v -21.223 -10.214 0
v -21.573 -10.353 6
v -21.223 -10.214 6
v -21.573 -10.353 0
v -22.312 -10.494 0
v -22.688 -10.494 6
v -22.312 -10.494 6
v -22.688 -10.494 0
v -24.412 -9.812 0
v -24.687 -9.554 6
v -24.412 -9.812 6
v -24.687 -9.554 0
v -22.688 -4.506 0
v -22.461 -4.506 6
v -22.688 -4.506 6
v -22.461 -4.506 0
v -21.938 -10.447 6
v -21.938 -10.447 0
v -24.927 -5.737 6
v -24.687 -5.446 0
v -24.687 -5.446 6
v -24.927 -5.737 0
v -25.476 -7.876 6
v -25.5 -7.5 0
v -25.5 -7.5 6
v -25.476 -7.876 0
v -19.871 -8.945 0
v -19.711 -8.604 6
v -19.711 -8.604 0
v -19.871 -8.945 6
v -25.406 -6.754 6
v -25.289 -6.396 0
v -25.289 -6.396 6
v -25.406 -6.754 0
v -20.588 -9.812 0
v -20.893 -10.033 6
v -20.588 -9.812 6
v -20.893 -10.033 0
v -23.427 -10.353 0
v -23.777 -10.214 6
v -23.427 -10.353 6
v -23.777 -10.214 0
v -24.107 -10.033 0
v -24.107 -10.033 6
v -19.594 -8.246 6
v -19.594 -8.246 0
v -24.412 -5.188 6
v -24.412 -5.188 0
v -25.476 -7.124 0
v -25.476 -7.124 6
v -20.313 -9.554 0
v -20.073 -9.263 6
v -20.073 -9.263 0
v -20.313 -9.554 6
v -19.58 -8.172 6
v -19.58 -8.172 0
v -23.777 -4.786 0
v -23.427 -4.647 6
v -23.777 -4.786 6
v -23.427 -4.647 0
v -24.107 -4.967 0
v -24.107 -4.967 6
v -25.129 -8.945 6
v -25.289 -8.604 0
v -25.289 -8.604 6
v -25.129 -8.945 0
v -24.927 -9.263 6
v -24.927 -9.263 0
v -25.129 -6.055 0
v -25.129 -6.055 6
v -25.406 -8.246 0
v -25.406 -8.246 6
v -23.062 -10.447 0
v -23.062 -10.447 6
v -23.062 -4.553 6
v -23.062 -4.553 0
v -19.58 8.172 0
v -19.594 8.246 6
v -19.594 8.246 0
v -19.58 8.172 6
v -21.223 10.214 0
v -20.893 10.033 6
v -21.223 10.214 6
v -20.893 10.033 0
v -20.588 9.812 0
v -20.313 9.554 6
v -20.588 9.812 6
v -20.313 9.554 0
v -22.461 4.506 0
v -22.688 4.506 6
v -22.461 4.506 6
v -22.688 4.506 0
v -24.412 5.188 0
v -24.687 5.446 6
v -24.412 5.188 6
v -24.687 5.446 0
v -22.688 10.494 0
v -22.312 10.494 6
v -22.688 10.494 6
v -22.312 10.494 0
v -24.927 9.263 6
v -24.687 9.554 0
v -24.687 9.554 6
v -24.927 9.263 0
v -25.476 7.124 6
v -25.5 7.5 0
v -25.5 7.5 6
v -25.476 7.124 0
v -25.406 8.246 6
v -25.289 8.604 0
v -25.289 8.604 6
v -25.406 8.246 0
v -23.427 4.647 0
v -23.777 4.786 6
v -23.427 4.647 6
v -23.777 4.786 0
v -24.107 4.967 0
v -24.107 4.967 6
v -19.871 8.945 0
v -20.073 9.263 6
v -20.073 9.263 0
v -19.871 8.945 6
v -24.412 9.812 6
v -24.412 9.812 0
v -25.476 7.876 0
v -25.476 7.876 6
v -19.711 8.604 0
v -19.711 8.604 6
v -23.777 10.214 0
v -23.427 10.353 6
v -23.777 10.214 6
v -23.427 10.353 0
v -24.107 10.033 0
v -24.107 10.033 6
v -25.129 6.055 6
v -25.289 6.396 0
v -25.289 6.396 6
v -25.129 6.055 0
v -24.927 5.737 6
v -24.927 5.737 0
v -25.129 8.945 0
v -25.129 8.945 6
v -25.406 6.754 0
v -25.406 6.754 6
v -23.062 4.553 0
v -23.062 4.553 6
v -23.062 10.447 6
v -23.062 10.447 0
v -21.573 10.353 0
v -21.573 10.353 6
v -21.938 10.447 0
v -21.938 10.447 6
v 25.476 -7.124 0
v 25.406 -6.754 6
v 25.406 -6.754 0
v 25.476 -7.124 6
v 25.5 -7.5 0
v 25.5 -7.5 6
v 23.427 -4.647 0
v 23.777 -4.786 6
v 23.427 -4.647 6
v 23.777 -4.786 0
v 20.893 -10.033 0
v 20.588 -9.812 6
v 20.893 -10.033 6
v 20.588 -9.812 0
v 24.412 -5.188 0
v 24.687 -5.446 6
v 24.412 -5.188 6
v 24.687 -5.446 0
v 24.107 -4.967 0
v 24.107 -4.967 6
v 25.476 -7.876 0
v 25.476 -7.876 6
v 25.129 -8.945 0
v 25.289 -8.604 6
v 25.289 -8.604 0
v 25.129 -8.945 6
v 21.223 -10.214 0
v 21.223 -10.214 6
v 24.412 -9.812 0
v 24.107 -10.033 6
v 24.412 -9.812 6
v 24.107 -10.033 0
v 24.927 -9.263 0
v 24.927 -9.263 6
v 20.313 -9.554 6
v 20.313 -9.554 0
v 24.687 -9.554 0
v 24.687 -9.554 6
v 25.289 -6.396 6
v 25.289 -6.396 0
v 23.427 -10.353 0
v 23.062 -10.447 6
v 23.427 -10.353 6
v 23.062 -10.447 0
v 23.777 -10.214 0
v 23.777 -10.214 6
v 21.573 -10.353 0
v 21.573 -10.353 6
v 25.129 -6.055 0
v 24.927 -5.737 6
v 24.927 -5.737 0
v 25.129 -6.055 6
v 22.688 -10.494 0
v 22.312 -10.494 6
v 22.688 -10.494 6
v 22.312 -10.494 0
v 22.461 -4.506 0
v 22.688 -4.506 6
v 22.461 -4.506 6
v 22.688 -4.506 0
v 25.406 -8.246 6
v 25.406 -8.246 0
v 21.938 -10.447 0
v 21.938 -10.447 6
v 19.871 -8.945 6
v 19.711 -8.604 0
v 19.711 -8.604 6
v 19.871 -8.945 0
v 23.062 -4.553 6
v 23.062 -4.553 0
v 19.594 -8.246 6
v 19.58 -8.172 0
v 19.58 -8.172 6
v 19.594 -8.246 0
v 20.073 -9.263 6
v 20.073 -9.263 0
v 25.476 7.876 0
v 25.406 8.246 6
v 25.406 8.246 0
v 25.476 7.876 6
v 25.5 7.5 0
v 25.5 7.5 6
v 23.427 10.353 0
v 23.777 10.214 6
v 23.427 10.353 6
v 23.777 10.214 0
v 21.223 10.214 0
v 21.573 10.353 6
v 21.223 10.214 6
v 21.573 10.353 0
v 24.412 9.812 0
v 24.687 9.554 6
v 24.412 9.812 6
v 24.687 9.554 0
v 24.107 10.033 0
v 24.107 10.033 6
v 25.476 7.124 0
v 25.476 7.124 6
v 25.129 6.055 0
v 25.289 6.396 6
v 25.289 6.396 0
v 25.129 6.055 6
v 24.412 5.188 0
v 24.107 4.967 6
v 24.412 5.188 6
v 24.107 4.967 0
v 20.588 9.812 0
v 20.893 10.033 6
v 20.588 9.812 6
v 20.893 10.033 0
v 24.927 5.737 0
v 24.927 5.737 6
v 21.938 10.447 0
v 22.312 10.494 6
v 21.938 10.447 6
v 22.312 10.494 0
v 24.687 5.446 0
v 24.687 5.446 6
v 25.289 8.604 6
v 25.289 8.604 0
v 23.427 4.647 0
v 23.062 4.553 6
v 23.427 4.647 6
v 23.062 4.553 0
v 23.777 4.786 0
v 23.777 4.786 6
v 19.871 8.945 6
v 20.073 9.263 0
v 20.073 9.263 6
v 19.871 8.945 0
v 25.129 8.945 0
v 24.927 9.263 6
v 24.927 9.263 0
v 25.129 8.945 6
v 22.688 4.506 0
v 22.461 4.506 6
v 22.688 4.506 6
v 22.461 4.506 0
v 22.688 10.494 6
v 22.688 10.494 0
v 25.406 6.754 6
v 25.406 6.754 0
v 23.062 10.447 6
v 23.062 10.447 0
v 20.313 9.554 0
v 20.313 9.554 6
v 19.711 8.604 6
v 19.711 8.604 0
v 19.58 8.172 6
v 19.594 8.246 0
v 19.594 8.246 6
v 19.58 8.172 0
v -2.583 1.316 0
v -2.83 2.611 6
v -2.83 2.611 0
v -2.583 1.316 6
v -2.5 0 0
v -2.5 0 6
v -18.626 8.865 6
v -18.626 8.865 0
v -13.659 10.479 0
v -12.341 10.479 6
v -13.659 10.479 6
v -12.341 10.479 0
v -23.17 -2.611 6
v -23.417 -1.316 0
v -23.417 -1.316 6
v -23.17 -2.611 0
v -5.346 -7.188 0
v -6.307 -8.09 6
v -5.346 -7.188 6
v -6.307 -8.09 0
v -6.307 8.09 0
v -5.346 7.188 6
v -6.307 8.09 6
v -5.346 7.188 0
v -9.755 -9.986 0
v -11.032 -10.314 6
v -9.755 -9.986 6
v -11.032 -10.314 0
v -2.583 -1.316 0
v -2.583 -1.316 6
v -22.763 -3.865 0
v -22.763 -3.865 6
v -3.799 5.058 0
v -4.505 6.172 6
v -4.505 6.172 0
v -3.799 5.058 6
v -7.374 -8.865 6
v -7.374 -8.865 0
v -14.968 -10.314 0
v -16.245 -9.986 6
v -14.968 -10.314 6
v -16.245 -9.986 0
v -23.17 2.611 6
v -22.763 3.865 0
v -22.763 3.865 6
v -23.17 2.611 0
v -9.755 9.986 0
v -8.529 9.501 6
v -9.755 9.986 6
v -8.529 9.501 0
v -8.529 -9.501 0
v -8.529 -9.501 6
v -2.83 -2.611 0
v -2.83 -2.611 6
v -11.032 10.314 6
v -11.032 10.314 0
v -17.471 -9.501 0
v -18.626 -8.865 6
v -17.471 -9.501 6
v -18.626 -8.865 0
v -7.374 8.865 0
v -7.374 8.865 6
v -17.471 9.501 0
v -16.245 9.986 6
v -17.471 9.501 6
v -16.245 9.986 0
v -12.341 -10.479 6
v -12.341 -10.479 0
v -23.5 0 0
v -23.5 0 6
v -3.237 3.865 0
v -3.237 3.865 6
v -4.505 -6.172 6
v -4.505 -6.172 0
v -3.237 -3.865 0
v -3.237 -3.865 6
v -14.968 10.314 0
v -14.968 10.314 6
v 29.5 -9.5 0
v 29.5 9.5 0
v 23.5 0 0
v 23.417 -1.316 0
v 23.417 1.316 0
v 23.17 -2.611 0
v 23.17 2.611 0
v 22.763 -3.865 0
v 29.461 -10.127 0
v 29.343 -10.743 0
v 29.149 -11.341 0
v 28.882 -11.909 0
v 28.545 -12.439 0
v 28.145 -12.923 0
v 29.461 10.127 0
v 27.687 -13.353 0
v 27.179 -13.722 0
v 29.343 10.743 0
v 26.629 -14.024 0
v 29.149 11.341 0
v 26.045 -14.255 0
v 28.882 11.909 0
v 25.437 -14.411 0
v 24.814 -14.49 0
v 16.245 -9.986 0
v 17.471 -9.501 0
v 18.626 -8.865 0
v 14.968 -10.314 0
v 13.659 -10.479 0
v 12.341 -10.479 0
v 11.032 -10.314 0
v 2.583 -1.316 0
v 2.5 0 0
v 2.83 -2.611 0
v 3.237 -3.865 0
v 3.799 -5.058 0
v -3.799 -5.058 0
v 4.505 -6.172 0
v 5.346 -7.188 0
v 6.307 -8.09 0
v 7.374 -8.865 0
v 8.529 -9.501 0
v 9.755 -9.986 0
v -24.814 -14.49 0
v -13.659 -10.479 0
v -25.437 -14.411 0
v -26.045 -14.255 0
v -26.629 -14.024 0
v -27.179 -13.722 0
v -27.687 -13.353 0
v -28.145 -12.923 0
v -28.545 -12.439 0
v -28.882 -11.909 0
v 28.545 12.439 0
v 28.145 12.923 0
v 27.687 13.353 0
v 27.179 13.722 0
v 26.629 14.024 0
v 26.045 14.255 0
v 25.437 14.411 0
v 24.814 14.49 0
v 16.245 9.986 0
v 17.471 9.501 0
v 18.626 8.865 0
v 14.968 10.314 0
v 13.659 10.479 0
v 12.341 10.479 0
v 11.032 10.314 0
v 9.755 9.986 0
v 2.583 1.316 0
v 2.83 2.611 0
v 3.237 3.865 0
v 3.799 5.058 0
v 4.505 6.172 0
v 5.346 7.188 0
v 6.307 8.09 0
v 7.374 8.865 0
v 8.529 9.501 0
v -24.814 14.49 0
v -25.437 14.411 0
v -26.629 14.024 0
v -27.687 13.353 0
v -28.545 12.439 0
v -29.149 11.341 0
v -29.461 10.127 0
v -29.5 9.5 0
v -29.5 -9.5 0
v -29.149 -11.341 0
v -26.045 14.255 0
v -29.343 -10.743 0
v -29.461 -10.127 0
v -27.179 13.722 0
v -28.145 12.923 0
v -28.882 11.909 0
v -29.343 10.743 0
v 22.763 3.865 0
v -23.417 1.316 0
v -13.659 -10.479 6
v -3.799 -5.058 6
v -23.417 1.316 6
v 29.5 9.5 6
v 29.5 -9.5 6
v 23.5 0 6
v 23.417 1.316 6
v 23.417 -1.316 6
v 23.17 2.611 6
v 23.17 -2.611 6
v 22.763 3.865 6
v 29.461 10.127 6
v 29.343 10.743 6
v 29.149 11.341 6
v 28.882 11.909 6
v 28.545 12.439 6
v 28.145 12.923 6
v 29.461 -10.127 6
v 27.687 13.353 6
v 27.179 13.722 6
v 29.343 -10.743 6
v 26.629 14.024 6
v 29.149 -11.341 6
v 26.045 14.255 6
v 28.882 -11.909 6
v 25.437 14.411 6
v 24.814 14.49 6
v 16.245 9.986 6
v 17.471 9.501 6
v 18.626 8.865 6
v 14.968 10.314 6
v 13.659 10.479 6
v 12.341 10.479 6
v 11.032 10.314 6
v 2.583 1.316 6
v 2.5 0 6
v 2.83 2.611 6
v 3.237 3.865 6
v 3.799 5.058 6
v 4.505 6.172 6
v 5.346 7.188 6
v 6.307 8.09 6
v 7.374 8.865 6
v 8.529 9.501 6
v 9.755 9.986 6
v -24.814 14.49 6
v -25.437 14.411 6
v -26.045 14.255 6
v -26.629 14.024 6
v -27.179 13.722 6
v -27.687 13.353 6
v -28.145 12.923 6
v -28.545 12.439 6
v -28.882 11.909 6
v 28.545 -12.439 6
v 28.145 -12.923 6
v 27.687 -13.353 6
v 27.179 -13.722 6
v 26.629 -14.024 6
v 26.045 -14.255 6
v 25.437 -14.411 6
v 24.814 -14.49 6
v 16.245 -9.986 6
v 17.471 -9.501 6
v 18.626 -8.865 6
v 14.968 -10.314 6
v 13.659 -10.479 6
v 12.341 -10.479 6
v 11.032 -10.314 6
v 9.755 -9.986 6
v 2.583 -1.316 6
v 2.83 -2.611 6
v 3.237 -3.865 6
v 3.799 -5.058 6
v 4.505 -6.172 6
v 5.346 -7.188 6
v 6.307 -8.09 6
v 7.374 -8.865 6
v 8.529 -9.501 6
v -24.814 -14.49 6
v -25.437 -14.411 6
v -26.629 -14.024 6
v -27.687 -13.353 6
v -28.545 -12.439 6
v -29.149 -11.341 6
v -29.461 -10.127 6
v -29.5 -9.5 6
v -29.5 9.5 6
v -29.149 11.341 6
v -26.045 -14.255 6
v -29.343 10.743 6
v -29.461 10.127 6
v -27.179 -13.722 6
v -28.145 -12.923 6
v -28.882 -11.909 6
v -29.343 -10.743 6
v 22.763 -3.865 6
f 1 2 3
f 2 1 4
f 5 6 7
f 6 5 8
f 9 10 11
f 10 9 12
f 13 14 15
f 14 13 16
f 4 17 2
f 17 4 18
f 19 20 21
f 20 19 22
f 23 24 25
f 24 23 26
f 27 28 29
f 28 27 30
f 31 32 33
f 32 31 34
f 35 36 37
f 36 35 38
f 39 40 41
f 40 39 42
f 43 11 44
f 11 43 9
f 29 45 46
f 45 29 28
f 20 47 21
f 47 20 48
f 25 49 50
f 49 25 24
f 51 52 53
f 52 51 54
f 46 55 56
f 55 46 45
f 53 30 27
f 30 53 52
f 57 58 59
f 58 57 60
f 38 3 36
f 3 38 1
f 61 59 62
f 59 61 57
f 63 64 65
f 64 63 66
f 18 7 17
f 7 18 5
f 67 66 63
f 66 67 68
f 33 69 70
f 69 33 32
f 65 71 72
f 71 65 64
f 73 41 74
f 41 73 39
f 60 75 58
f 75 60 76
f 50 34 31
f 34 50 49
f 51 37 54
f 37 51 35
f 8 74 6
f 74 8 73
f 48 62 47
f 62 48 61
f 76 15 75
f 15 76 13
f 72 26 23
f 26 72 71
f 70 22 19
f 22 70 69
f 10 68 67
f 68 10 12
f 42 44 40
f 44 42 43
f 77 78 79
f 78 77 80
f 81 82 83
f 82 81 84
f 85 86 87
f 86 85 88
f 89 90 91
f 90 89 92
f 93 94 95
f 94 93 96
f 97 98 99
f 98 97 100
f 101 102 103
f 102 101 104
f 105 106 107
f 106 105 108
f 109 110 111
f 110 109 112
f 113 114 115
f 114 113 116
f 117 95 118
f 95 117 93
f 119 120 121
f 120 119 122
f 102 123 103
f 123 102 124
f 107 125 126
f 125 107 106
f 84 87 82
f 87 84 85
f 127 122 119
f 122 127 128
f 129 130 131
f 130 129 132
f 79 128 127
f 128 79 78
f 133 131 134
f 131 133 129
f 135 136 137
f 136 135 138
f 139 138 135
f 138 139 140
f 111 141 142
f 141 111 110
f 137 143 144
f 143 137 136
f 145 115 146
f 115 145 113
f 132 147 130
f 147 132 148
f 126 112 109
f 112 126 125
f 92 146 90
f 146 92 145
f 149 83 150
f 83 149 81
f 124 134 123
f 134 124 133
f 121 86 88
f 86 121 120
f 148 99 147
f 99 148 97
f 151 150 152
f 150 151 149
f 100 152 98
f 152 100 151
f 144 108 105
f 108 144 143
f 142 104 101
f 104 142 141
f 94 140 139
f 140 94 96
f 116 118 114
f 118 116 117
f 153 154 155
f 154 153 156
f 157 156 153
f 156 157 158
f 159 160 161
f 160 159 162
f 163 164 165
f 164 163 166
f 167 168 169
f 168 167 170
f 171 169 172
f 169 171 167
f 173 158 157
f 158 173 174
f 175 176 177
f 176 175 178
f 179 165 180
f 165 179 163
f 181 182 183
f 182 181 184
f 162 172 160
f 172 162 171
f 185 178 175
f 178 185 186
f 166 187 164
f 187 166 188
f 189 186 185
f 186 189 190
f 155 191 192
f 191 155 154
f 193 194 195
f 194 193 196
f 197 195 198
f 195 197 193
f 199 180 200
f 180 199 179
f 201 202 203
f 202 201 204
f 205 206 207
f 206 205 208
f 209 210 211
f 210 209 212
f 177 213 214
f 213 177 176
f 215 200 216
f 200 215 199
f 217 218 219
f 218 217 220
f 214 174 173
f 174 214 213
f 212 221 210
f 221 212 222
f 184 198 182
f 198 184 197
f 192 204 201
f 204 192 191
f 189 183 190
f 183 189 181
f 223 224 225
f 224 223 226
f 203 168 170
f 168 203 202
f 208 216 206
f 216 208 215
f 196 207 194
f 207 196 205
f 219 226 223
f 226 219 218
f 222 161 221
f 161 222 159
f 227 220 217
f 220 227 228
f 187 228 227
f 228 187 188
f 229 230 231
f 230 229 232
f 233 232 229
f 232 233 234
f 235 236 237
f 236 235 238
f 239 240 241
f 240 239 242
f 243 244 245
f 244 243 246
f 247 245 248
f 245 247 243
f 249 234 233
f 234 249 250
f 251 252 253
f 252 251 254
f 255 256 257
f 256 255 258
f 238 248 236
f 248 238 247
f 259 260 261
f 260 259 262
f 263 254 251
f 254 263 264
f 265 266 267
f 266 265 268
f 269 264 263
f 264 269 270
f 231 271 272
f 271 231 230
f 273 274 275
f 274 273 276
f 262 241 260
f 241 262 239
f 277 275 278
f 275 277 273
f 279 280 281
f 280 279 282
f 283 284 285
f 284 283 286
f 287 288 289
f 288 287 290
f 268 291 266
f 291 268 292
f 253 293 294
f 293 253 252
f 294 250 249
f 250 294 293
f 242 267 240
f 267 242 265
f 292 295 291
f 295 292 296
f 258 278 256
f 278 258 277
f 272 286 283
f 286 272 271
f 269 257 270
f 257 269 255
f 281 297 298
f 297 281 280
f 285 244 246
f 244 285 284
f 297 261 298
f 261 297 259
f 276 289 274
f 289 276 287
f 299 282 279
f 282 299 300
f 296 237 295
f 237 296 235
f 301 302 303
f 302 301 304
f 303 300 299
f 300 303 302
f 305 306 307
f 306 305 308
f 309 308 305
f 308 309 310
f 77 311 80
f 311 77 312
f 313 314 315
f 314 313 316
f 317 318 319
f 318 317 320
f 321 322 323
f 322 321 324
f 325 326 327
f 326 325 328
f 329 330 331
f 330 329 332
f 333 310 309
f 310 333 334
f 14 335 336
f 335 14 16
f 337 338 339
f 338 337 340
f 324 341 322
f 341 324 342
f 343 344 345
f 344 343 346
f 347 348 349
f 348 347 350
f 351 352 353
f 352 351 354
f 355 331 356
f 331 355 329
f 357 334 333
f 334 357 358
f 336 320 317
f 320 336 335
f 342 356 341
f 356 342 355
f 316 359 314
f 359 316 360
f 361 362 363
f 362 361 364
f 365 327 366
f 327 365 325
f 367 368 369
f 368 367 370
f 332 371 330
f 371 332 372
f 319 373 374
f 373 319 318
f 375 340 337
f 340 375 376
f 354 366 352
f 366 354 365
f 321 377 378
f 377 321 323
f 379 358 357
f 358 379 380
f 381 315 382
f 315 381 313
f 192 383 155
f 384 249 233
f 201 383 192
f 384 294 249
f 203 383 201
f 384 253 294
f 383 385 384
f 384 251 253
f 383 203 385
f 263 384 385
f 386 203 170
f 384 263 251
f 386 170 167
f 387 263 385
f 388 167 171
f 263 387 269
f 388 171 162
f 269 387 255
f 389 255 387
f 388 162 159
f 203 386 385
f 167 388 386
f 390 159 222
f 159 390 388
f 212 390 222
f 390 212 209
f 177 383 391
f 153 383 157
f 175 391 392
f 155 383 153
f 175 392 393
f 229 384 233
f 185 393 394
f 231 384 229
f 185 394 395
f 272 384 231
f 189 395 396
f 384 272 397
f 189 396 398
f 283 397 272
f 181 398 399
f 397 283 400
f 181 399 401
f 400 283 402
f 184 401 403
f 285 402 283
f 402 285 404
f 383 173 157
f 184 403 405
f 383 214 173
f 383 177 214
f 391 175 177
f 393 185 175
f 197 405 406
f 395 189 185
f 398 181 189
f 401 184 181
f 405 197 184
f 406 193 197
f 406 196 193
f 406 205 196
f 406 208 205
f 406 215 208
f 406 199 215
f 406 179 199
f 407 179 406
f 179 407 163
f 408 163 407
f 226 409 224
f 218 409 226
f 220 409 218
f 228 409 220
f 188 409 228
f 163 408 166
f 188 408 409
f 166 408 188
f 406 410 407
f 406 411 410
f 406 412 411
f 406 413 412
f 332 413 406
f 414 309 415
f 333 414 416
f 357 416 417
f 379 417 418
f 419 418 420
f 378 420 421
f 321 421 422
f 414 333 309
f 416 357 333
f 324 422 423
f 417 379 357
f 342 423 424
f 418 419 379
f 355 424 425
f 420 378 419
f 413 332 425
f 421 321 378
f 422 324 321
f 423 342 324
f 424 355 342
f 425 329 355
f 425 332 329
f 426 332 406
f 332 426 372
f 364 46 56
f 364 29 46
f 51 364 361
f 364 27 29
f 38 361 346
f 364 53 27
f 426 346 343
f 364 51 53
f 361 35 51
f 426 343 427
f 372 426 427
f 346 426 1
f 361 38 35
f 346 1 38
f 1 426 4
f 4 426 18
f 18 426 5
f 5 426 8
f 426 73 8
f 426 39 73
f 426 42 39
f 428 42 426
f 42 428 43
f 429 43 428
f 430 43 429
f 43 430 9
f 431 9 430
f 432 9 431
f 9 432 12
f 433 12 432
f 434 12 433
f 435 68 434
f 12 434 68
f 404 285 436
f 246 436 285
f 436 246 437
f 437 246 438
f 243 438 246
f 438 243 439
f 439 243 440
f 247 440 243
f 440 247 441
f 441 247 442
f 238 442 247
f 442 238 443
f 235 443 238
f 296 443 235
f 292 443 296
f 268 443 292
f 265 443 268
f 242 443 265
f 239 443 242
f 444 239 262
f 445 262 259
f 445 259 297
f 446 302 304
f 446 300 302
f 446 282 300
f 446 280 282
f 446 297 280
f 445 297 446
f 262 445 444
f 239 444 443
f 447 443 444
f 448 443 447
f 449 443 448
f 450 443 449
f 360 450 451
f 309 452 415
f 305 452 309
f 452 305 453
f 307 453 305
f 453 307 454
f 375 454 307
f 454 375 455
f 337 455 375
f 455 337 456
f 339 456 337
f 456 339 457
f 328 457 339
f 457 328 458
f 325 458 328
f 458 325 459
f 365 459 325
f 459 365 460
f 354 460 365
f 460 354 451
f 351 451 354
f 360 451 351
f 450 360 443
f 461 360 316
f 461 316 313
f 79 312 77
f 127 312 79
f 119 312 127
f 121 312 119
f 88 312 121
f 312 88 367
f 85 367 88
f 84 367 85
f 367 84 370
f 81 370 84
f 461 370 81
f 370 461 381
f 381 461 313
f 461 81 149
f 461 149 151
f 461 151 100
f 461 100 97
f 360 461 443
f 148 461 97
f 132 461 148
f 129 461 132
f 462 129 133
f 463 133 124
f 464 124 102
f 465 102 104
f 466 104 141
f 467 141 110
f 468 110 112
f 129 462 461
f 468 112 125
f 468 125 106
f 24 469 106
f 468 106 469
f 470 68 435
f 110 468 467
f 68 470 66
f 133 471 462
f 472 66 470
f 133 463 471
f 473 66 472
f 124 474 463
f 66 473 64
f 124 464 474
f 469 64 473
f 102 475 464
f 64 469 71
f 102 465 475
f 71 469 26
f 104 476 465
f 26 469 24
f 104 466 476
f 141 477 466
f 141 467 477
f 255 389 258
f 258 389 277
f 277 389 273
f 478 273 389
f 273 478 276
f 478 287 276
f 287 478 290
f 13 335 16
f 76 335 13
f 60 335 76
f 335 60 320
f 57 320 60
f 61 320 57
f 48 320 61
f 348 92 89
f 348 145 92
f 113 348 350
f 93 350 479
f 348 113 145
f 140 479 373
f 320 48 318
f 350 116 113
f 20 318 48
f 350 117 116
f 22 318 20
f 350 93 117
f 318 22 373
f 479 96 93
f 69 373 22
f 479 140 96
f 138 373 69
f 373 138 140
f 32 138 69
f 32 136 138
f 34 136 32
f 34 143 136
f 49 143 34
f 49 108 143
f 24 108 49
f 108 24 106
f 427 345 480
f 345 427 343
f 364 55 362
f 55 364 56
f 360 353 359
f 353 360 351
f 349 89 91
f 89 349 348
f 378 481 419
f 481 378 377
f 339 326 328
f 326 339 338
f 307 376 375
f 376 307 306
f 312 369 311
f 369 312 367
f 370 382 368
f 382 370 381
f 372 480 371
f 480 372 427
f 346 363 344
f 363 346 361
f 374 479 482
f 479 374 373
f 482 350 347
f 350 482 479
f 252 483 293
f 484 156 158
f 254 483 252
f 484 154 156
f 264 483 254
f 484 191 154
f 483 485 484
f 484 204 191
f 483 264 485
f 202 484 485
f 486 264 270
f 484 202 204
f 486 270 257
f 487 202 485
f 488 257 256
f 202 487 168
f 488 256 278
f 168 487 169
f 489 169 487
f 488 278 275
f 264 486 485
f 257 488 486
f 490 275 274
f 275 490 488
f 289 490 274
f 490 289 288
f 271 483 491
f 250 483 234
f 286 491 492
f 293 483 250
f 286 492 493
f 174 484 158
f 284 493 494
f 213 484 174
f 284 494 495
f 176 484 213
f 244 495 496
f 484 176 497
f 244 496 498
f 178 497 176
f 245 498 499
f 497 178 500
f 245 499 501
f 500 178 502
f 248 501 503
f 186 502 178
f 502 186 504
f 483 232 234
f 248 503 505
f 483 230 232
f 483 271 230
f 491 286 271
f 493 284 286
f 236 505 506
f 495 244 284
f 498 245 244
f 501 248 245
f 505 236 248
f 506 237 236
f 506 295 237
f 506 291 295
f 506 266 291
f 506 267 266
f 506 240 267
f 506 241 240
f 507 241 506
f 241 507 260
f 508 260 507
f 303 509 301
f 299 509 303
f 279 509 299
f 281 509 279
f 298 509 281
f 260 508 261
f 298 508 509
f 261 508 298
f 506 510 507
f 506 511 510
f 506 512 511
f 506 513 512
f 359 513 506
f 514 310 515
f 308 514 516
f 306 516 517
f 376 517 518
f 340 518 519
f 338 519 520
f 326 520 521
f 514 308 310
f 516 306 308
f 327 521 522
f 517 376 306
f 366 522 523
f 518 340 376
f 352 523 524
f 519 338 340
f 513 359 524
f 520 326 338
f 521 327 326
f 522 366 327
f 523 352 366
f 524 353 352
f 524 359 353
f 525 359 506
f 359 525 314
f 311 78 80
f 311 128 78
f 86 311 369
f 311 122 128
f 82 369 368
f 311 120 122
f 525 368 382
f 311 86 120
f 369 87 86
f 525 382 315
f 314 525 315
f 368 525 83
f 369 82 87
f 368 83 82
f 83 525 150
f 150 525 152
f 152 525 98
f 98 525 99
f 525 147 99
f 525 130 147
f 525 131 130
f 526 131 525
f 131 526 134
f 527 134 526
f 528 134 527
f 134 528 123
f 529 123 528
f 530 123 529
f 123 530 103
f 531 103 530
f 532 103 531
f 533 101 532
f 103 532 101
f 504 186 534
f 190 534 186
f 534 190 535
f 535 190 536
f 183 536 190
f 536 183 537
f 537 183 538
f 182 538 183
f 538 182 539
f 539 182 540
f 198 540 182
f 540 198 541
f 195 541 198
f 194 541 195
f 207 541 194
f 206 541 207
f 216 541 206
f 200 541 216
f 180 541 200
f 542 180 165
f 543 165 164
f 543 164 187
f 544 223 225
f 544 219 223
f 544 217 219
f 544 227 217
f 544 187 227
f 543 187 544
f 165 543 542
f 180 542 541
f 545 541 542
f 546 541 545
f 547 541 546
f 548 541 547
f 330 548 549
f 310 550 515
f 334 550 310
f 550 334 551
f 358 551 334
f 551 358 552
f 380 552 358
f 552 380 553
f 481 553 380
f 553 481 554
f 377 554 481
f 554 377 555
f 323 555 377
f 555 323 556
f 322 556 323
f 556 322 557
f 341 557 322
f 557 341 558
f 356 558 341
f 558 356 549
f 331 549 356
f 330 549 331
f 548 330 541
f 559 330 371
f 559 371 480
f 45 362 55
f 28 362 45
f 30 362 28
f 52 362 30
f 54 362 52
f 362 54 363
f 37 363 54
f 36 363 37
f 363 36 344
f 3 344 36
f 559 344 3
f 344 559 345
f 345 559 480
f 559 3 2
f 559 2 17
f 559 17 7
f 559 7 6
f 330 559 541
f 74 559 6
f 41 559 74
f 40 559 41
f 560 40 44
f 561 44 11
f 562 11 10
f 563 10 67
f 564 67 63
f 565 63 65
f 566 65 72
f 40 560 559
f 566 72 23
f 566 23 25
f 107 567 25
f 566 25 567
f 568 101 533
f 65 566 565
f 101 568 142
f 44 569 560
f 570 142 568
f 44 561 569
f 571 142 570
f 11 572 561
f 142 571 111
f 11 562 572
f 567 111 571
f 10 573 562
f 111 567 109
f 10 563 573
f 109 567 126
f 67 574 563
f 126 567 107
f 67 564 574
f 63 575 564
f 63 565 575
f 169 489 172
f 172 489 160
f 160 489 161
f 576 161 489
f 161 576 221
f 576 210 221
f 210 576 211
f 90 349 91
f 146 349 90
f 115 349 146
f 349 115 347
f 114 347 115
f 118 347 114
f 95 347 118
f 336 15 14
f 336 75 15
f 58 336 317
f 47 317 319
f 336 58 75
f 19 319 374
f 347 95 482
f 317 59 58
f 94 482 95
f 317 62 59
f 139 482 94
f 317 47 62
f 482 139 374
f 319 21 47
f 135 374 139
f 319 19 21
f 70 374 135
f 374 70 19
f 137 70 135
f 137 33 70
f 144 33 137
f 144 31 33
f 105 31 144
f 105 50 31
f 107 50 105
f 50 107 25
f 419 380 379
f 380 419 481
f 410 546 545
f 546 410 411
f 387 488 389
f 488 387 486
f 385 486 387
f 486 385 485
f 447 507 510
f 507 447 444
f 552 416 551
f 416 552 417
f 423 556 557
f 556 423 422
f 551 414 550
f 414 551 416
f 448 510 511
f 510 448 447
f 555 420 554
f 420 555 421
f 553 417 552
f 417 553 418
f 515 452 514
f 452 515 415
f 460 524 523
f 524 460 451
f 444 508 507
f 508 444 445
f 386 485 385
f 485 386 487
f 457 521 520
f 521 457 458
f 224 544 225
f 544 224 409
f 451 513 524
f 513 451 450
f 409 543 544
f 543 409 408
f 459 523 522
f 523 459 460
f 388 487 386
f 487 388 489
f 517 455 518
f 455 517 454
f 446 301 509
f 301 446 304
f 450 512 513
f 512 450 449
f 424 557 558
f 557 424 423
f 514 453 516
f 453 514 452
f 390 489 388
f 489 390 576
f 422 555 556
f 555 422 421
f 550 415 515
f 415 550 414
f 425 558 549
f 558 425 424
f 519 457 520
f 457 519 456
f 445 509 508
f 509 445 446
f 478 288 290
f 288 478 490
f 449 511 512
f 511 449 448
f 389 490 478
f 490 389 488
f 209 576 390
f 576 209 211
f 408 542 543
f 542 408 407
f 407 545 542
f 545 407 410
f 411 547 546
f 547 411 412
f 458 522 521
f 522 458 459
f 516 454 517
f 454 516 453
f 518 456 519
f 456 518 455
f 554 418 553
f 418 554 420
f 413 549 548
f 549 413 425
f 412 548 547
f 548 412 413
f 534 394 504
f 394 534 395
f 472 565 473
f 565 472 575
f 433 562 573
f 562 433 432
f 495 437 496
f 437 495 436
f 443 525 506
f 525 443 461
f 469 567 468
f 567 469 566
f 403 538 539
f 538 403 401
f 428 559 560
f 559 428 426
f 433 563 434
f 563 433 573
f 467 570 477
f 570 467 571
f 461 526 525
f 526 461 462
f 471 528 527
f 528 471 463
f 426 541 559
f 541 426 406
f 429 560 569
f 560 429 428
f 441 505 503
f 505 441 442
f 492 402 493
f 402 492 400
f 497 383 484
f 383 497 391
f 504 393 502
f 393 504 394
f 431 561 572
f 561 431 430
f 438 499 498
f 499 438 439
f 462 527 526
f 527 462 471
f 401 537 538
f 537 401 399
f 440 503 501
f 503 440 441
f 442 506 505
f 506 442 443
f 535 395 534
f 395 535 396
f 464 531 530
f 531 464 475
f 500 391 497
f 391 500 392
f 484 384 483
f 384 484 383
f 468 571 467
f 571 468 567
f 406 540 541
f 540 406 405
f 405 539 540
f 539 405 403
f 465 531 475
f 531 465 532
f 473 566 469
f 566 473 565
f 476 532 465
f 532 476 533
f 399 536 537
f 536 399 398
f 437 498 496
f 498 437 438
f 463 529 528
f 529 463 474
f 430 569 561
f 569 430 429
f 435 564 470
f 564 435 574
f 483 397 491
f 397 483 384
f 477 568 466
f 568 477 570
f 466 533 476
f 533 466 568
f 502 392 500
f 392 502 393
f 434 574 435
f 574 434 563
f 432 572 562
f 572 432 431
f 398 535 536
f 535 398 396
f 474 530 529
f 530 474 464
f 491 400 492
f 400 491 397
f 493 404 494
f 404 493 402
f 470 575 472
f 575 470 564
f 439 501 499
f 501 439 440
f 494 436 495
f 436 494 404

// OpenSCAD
$fn = 50;


difference() {
	union() {
		hull() {
			translate(v = [-24.5000000000, 9.5000000000, 0]) {
				cylinder(h = 6, r = 5);
			}
			translate(v = [24.5000000000, 9.5000000000, 0]) {
				cylinder(h = 6, r = 5);
			}
			translate(v = [-24.5000000000, -9.5000000000, 0]) {
				cylinder(h = 6, r = 5);
			}
			translate(v = [24.5000000000, -9.5000000000, 0]) {
				cylinder(h = 6, r = 5);
			}
		}
	}
	union() {
		#translate(v = [-22.5000000000, -7.5000000000, -100.0000000000]) {
			cylinder(h = 200, r = 3.0000000000);
		}
		#translate(v = [-22.5000000000, 7.5000000000, -100.0000000000]) {
			cylinder(h = 200, r = 3.0000000000);
		}
		#translate(v = [22.5000000000, -7.5000000000, -100.0000000000]) {
			cylinder(h = 200, r = 3.0000000000);
		}
		#translate(v = [22.5000000000, 7.5000000000, -100.0000000000]) {
			cylinder(h = 200, r = 3.0000000000);
		}
		#translate(v = [-13.0000000000, 0, 0]) {
			cylinder(h = 6, r = 10.5000000000);
		}
		#translate(v = [13.0000000000, 0, 0]) {
			cylinder(h = 6, r = 10.5000000000);
		}
	}
}
